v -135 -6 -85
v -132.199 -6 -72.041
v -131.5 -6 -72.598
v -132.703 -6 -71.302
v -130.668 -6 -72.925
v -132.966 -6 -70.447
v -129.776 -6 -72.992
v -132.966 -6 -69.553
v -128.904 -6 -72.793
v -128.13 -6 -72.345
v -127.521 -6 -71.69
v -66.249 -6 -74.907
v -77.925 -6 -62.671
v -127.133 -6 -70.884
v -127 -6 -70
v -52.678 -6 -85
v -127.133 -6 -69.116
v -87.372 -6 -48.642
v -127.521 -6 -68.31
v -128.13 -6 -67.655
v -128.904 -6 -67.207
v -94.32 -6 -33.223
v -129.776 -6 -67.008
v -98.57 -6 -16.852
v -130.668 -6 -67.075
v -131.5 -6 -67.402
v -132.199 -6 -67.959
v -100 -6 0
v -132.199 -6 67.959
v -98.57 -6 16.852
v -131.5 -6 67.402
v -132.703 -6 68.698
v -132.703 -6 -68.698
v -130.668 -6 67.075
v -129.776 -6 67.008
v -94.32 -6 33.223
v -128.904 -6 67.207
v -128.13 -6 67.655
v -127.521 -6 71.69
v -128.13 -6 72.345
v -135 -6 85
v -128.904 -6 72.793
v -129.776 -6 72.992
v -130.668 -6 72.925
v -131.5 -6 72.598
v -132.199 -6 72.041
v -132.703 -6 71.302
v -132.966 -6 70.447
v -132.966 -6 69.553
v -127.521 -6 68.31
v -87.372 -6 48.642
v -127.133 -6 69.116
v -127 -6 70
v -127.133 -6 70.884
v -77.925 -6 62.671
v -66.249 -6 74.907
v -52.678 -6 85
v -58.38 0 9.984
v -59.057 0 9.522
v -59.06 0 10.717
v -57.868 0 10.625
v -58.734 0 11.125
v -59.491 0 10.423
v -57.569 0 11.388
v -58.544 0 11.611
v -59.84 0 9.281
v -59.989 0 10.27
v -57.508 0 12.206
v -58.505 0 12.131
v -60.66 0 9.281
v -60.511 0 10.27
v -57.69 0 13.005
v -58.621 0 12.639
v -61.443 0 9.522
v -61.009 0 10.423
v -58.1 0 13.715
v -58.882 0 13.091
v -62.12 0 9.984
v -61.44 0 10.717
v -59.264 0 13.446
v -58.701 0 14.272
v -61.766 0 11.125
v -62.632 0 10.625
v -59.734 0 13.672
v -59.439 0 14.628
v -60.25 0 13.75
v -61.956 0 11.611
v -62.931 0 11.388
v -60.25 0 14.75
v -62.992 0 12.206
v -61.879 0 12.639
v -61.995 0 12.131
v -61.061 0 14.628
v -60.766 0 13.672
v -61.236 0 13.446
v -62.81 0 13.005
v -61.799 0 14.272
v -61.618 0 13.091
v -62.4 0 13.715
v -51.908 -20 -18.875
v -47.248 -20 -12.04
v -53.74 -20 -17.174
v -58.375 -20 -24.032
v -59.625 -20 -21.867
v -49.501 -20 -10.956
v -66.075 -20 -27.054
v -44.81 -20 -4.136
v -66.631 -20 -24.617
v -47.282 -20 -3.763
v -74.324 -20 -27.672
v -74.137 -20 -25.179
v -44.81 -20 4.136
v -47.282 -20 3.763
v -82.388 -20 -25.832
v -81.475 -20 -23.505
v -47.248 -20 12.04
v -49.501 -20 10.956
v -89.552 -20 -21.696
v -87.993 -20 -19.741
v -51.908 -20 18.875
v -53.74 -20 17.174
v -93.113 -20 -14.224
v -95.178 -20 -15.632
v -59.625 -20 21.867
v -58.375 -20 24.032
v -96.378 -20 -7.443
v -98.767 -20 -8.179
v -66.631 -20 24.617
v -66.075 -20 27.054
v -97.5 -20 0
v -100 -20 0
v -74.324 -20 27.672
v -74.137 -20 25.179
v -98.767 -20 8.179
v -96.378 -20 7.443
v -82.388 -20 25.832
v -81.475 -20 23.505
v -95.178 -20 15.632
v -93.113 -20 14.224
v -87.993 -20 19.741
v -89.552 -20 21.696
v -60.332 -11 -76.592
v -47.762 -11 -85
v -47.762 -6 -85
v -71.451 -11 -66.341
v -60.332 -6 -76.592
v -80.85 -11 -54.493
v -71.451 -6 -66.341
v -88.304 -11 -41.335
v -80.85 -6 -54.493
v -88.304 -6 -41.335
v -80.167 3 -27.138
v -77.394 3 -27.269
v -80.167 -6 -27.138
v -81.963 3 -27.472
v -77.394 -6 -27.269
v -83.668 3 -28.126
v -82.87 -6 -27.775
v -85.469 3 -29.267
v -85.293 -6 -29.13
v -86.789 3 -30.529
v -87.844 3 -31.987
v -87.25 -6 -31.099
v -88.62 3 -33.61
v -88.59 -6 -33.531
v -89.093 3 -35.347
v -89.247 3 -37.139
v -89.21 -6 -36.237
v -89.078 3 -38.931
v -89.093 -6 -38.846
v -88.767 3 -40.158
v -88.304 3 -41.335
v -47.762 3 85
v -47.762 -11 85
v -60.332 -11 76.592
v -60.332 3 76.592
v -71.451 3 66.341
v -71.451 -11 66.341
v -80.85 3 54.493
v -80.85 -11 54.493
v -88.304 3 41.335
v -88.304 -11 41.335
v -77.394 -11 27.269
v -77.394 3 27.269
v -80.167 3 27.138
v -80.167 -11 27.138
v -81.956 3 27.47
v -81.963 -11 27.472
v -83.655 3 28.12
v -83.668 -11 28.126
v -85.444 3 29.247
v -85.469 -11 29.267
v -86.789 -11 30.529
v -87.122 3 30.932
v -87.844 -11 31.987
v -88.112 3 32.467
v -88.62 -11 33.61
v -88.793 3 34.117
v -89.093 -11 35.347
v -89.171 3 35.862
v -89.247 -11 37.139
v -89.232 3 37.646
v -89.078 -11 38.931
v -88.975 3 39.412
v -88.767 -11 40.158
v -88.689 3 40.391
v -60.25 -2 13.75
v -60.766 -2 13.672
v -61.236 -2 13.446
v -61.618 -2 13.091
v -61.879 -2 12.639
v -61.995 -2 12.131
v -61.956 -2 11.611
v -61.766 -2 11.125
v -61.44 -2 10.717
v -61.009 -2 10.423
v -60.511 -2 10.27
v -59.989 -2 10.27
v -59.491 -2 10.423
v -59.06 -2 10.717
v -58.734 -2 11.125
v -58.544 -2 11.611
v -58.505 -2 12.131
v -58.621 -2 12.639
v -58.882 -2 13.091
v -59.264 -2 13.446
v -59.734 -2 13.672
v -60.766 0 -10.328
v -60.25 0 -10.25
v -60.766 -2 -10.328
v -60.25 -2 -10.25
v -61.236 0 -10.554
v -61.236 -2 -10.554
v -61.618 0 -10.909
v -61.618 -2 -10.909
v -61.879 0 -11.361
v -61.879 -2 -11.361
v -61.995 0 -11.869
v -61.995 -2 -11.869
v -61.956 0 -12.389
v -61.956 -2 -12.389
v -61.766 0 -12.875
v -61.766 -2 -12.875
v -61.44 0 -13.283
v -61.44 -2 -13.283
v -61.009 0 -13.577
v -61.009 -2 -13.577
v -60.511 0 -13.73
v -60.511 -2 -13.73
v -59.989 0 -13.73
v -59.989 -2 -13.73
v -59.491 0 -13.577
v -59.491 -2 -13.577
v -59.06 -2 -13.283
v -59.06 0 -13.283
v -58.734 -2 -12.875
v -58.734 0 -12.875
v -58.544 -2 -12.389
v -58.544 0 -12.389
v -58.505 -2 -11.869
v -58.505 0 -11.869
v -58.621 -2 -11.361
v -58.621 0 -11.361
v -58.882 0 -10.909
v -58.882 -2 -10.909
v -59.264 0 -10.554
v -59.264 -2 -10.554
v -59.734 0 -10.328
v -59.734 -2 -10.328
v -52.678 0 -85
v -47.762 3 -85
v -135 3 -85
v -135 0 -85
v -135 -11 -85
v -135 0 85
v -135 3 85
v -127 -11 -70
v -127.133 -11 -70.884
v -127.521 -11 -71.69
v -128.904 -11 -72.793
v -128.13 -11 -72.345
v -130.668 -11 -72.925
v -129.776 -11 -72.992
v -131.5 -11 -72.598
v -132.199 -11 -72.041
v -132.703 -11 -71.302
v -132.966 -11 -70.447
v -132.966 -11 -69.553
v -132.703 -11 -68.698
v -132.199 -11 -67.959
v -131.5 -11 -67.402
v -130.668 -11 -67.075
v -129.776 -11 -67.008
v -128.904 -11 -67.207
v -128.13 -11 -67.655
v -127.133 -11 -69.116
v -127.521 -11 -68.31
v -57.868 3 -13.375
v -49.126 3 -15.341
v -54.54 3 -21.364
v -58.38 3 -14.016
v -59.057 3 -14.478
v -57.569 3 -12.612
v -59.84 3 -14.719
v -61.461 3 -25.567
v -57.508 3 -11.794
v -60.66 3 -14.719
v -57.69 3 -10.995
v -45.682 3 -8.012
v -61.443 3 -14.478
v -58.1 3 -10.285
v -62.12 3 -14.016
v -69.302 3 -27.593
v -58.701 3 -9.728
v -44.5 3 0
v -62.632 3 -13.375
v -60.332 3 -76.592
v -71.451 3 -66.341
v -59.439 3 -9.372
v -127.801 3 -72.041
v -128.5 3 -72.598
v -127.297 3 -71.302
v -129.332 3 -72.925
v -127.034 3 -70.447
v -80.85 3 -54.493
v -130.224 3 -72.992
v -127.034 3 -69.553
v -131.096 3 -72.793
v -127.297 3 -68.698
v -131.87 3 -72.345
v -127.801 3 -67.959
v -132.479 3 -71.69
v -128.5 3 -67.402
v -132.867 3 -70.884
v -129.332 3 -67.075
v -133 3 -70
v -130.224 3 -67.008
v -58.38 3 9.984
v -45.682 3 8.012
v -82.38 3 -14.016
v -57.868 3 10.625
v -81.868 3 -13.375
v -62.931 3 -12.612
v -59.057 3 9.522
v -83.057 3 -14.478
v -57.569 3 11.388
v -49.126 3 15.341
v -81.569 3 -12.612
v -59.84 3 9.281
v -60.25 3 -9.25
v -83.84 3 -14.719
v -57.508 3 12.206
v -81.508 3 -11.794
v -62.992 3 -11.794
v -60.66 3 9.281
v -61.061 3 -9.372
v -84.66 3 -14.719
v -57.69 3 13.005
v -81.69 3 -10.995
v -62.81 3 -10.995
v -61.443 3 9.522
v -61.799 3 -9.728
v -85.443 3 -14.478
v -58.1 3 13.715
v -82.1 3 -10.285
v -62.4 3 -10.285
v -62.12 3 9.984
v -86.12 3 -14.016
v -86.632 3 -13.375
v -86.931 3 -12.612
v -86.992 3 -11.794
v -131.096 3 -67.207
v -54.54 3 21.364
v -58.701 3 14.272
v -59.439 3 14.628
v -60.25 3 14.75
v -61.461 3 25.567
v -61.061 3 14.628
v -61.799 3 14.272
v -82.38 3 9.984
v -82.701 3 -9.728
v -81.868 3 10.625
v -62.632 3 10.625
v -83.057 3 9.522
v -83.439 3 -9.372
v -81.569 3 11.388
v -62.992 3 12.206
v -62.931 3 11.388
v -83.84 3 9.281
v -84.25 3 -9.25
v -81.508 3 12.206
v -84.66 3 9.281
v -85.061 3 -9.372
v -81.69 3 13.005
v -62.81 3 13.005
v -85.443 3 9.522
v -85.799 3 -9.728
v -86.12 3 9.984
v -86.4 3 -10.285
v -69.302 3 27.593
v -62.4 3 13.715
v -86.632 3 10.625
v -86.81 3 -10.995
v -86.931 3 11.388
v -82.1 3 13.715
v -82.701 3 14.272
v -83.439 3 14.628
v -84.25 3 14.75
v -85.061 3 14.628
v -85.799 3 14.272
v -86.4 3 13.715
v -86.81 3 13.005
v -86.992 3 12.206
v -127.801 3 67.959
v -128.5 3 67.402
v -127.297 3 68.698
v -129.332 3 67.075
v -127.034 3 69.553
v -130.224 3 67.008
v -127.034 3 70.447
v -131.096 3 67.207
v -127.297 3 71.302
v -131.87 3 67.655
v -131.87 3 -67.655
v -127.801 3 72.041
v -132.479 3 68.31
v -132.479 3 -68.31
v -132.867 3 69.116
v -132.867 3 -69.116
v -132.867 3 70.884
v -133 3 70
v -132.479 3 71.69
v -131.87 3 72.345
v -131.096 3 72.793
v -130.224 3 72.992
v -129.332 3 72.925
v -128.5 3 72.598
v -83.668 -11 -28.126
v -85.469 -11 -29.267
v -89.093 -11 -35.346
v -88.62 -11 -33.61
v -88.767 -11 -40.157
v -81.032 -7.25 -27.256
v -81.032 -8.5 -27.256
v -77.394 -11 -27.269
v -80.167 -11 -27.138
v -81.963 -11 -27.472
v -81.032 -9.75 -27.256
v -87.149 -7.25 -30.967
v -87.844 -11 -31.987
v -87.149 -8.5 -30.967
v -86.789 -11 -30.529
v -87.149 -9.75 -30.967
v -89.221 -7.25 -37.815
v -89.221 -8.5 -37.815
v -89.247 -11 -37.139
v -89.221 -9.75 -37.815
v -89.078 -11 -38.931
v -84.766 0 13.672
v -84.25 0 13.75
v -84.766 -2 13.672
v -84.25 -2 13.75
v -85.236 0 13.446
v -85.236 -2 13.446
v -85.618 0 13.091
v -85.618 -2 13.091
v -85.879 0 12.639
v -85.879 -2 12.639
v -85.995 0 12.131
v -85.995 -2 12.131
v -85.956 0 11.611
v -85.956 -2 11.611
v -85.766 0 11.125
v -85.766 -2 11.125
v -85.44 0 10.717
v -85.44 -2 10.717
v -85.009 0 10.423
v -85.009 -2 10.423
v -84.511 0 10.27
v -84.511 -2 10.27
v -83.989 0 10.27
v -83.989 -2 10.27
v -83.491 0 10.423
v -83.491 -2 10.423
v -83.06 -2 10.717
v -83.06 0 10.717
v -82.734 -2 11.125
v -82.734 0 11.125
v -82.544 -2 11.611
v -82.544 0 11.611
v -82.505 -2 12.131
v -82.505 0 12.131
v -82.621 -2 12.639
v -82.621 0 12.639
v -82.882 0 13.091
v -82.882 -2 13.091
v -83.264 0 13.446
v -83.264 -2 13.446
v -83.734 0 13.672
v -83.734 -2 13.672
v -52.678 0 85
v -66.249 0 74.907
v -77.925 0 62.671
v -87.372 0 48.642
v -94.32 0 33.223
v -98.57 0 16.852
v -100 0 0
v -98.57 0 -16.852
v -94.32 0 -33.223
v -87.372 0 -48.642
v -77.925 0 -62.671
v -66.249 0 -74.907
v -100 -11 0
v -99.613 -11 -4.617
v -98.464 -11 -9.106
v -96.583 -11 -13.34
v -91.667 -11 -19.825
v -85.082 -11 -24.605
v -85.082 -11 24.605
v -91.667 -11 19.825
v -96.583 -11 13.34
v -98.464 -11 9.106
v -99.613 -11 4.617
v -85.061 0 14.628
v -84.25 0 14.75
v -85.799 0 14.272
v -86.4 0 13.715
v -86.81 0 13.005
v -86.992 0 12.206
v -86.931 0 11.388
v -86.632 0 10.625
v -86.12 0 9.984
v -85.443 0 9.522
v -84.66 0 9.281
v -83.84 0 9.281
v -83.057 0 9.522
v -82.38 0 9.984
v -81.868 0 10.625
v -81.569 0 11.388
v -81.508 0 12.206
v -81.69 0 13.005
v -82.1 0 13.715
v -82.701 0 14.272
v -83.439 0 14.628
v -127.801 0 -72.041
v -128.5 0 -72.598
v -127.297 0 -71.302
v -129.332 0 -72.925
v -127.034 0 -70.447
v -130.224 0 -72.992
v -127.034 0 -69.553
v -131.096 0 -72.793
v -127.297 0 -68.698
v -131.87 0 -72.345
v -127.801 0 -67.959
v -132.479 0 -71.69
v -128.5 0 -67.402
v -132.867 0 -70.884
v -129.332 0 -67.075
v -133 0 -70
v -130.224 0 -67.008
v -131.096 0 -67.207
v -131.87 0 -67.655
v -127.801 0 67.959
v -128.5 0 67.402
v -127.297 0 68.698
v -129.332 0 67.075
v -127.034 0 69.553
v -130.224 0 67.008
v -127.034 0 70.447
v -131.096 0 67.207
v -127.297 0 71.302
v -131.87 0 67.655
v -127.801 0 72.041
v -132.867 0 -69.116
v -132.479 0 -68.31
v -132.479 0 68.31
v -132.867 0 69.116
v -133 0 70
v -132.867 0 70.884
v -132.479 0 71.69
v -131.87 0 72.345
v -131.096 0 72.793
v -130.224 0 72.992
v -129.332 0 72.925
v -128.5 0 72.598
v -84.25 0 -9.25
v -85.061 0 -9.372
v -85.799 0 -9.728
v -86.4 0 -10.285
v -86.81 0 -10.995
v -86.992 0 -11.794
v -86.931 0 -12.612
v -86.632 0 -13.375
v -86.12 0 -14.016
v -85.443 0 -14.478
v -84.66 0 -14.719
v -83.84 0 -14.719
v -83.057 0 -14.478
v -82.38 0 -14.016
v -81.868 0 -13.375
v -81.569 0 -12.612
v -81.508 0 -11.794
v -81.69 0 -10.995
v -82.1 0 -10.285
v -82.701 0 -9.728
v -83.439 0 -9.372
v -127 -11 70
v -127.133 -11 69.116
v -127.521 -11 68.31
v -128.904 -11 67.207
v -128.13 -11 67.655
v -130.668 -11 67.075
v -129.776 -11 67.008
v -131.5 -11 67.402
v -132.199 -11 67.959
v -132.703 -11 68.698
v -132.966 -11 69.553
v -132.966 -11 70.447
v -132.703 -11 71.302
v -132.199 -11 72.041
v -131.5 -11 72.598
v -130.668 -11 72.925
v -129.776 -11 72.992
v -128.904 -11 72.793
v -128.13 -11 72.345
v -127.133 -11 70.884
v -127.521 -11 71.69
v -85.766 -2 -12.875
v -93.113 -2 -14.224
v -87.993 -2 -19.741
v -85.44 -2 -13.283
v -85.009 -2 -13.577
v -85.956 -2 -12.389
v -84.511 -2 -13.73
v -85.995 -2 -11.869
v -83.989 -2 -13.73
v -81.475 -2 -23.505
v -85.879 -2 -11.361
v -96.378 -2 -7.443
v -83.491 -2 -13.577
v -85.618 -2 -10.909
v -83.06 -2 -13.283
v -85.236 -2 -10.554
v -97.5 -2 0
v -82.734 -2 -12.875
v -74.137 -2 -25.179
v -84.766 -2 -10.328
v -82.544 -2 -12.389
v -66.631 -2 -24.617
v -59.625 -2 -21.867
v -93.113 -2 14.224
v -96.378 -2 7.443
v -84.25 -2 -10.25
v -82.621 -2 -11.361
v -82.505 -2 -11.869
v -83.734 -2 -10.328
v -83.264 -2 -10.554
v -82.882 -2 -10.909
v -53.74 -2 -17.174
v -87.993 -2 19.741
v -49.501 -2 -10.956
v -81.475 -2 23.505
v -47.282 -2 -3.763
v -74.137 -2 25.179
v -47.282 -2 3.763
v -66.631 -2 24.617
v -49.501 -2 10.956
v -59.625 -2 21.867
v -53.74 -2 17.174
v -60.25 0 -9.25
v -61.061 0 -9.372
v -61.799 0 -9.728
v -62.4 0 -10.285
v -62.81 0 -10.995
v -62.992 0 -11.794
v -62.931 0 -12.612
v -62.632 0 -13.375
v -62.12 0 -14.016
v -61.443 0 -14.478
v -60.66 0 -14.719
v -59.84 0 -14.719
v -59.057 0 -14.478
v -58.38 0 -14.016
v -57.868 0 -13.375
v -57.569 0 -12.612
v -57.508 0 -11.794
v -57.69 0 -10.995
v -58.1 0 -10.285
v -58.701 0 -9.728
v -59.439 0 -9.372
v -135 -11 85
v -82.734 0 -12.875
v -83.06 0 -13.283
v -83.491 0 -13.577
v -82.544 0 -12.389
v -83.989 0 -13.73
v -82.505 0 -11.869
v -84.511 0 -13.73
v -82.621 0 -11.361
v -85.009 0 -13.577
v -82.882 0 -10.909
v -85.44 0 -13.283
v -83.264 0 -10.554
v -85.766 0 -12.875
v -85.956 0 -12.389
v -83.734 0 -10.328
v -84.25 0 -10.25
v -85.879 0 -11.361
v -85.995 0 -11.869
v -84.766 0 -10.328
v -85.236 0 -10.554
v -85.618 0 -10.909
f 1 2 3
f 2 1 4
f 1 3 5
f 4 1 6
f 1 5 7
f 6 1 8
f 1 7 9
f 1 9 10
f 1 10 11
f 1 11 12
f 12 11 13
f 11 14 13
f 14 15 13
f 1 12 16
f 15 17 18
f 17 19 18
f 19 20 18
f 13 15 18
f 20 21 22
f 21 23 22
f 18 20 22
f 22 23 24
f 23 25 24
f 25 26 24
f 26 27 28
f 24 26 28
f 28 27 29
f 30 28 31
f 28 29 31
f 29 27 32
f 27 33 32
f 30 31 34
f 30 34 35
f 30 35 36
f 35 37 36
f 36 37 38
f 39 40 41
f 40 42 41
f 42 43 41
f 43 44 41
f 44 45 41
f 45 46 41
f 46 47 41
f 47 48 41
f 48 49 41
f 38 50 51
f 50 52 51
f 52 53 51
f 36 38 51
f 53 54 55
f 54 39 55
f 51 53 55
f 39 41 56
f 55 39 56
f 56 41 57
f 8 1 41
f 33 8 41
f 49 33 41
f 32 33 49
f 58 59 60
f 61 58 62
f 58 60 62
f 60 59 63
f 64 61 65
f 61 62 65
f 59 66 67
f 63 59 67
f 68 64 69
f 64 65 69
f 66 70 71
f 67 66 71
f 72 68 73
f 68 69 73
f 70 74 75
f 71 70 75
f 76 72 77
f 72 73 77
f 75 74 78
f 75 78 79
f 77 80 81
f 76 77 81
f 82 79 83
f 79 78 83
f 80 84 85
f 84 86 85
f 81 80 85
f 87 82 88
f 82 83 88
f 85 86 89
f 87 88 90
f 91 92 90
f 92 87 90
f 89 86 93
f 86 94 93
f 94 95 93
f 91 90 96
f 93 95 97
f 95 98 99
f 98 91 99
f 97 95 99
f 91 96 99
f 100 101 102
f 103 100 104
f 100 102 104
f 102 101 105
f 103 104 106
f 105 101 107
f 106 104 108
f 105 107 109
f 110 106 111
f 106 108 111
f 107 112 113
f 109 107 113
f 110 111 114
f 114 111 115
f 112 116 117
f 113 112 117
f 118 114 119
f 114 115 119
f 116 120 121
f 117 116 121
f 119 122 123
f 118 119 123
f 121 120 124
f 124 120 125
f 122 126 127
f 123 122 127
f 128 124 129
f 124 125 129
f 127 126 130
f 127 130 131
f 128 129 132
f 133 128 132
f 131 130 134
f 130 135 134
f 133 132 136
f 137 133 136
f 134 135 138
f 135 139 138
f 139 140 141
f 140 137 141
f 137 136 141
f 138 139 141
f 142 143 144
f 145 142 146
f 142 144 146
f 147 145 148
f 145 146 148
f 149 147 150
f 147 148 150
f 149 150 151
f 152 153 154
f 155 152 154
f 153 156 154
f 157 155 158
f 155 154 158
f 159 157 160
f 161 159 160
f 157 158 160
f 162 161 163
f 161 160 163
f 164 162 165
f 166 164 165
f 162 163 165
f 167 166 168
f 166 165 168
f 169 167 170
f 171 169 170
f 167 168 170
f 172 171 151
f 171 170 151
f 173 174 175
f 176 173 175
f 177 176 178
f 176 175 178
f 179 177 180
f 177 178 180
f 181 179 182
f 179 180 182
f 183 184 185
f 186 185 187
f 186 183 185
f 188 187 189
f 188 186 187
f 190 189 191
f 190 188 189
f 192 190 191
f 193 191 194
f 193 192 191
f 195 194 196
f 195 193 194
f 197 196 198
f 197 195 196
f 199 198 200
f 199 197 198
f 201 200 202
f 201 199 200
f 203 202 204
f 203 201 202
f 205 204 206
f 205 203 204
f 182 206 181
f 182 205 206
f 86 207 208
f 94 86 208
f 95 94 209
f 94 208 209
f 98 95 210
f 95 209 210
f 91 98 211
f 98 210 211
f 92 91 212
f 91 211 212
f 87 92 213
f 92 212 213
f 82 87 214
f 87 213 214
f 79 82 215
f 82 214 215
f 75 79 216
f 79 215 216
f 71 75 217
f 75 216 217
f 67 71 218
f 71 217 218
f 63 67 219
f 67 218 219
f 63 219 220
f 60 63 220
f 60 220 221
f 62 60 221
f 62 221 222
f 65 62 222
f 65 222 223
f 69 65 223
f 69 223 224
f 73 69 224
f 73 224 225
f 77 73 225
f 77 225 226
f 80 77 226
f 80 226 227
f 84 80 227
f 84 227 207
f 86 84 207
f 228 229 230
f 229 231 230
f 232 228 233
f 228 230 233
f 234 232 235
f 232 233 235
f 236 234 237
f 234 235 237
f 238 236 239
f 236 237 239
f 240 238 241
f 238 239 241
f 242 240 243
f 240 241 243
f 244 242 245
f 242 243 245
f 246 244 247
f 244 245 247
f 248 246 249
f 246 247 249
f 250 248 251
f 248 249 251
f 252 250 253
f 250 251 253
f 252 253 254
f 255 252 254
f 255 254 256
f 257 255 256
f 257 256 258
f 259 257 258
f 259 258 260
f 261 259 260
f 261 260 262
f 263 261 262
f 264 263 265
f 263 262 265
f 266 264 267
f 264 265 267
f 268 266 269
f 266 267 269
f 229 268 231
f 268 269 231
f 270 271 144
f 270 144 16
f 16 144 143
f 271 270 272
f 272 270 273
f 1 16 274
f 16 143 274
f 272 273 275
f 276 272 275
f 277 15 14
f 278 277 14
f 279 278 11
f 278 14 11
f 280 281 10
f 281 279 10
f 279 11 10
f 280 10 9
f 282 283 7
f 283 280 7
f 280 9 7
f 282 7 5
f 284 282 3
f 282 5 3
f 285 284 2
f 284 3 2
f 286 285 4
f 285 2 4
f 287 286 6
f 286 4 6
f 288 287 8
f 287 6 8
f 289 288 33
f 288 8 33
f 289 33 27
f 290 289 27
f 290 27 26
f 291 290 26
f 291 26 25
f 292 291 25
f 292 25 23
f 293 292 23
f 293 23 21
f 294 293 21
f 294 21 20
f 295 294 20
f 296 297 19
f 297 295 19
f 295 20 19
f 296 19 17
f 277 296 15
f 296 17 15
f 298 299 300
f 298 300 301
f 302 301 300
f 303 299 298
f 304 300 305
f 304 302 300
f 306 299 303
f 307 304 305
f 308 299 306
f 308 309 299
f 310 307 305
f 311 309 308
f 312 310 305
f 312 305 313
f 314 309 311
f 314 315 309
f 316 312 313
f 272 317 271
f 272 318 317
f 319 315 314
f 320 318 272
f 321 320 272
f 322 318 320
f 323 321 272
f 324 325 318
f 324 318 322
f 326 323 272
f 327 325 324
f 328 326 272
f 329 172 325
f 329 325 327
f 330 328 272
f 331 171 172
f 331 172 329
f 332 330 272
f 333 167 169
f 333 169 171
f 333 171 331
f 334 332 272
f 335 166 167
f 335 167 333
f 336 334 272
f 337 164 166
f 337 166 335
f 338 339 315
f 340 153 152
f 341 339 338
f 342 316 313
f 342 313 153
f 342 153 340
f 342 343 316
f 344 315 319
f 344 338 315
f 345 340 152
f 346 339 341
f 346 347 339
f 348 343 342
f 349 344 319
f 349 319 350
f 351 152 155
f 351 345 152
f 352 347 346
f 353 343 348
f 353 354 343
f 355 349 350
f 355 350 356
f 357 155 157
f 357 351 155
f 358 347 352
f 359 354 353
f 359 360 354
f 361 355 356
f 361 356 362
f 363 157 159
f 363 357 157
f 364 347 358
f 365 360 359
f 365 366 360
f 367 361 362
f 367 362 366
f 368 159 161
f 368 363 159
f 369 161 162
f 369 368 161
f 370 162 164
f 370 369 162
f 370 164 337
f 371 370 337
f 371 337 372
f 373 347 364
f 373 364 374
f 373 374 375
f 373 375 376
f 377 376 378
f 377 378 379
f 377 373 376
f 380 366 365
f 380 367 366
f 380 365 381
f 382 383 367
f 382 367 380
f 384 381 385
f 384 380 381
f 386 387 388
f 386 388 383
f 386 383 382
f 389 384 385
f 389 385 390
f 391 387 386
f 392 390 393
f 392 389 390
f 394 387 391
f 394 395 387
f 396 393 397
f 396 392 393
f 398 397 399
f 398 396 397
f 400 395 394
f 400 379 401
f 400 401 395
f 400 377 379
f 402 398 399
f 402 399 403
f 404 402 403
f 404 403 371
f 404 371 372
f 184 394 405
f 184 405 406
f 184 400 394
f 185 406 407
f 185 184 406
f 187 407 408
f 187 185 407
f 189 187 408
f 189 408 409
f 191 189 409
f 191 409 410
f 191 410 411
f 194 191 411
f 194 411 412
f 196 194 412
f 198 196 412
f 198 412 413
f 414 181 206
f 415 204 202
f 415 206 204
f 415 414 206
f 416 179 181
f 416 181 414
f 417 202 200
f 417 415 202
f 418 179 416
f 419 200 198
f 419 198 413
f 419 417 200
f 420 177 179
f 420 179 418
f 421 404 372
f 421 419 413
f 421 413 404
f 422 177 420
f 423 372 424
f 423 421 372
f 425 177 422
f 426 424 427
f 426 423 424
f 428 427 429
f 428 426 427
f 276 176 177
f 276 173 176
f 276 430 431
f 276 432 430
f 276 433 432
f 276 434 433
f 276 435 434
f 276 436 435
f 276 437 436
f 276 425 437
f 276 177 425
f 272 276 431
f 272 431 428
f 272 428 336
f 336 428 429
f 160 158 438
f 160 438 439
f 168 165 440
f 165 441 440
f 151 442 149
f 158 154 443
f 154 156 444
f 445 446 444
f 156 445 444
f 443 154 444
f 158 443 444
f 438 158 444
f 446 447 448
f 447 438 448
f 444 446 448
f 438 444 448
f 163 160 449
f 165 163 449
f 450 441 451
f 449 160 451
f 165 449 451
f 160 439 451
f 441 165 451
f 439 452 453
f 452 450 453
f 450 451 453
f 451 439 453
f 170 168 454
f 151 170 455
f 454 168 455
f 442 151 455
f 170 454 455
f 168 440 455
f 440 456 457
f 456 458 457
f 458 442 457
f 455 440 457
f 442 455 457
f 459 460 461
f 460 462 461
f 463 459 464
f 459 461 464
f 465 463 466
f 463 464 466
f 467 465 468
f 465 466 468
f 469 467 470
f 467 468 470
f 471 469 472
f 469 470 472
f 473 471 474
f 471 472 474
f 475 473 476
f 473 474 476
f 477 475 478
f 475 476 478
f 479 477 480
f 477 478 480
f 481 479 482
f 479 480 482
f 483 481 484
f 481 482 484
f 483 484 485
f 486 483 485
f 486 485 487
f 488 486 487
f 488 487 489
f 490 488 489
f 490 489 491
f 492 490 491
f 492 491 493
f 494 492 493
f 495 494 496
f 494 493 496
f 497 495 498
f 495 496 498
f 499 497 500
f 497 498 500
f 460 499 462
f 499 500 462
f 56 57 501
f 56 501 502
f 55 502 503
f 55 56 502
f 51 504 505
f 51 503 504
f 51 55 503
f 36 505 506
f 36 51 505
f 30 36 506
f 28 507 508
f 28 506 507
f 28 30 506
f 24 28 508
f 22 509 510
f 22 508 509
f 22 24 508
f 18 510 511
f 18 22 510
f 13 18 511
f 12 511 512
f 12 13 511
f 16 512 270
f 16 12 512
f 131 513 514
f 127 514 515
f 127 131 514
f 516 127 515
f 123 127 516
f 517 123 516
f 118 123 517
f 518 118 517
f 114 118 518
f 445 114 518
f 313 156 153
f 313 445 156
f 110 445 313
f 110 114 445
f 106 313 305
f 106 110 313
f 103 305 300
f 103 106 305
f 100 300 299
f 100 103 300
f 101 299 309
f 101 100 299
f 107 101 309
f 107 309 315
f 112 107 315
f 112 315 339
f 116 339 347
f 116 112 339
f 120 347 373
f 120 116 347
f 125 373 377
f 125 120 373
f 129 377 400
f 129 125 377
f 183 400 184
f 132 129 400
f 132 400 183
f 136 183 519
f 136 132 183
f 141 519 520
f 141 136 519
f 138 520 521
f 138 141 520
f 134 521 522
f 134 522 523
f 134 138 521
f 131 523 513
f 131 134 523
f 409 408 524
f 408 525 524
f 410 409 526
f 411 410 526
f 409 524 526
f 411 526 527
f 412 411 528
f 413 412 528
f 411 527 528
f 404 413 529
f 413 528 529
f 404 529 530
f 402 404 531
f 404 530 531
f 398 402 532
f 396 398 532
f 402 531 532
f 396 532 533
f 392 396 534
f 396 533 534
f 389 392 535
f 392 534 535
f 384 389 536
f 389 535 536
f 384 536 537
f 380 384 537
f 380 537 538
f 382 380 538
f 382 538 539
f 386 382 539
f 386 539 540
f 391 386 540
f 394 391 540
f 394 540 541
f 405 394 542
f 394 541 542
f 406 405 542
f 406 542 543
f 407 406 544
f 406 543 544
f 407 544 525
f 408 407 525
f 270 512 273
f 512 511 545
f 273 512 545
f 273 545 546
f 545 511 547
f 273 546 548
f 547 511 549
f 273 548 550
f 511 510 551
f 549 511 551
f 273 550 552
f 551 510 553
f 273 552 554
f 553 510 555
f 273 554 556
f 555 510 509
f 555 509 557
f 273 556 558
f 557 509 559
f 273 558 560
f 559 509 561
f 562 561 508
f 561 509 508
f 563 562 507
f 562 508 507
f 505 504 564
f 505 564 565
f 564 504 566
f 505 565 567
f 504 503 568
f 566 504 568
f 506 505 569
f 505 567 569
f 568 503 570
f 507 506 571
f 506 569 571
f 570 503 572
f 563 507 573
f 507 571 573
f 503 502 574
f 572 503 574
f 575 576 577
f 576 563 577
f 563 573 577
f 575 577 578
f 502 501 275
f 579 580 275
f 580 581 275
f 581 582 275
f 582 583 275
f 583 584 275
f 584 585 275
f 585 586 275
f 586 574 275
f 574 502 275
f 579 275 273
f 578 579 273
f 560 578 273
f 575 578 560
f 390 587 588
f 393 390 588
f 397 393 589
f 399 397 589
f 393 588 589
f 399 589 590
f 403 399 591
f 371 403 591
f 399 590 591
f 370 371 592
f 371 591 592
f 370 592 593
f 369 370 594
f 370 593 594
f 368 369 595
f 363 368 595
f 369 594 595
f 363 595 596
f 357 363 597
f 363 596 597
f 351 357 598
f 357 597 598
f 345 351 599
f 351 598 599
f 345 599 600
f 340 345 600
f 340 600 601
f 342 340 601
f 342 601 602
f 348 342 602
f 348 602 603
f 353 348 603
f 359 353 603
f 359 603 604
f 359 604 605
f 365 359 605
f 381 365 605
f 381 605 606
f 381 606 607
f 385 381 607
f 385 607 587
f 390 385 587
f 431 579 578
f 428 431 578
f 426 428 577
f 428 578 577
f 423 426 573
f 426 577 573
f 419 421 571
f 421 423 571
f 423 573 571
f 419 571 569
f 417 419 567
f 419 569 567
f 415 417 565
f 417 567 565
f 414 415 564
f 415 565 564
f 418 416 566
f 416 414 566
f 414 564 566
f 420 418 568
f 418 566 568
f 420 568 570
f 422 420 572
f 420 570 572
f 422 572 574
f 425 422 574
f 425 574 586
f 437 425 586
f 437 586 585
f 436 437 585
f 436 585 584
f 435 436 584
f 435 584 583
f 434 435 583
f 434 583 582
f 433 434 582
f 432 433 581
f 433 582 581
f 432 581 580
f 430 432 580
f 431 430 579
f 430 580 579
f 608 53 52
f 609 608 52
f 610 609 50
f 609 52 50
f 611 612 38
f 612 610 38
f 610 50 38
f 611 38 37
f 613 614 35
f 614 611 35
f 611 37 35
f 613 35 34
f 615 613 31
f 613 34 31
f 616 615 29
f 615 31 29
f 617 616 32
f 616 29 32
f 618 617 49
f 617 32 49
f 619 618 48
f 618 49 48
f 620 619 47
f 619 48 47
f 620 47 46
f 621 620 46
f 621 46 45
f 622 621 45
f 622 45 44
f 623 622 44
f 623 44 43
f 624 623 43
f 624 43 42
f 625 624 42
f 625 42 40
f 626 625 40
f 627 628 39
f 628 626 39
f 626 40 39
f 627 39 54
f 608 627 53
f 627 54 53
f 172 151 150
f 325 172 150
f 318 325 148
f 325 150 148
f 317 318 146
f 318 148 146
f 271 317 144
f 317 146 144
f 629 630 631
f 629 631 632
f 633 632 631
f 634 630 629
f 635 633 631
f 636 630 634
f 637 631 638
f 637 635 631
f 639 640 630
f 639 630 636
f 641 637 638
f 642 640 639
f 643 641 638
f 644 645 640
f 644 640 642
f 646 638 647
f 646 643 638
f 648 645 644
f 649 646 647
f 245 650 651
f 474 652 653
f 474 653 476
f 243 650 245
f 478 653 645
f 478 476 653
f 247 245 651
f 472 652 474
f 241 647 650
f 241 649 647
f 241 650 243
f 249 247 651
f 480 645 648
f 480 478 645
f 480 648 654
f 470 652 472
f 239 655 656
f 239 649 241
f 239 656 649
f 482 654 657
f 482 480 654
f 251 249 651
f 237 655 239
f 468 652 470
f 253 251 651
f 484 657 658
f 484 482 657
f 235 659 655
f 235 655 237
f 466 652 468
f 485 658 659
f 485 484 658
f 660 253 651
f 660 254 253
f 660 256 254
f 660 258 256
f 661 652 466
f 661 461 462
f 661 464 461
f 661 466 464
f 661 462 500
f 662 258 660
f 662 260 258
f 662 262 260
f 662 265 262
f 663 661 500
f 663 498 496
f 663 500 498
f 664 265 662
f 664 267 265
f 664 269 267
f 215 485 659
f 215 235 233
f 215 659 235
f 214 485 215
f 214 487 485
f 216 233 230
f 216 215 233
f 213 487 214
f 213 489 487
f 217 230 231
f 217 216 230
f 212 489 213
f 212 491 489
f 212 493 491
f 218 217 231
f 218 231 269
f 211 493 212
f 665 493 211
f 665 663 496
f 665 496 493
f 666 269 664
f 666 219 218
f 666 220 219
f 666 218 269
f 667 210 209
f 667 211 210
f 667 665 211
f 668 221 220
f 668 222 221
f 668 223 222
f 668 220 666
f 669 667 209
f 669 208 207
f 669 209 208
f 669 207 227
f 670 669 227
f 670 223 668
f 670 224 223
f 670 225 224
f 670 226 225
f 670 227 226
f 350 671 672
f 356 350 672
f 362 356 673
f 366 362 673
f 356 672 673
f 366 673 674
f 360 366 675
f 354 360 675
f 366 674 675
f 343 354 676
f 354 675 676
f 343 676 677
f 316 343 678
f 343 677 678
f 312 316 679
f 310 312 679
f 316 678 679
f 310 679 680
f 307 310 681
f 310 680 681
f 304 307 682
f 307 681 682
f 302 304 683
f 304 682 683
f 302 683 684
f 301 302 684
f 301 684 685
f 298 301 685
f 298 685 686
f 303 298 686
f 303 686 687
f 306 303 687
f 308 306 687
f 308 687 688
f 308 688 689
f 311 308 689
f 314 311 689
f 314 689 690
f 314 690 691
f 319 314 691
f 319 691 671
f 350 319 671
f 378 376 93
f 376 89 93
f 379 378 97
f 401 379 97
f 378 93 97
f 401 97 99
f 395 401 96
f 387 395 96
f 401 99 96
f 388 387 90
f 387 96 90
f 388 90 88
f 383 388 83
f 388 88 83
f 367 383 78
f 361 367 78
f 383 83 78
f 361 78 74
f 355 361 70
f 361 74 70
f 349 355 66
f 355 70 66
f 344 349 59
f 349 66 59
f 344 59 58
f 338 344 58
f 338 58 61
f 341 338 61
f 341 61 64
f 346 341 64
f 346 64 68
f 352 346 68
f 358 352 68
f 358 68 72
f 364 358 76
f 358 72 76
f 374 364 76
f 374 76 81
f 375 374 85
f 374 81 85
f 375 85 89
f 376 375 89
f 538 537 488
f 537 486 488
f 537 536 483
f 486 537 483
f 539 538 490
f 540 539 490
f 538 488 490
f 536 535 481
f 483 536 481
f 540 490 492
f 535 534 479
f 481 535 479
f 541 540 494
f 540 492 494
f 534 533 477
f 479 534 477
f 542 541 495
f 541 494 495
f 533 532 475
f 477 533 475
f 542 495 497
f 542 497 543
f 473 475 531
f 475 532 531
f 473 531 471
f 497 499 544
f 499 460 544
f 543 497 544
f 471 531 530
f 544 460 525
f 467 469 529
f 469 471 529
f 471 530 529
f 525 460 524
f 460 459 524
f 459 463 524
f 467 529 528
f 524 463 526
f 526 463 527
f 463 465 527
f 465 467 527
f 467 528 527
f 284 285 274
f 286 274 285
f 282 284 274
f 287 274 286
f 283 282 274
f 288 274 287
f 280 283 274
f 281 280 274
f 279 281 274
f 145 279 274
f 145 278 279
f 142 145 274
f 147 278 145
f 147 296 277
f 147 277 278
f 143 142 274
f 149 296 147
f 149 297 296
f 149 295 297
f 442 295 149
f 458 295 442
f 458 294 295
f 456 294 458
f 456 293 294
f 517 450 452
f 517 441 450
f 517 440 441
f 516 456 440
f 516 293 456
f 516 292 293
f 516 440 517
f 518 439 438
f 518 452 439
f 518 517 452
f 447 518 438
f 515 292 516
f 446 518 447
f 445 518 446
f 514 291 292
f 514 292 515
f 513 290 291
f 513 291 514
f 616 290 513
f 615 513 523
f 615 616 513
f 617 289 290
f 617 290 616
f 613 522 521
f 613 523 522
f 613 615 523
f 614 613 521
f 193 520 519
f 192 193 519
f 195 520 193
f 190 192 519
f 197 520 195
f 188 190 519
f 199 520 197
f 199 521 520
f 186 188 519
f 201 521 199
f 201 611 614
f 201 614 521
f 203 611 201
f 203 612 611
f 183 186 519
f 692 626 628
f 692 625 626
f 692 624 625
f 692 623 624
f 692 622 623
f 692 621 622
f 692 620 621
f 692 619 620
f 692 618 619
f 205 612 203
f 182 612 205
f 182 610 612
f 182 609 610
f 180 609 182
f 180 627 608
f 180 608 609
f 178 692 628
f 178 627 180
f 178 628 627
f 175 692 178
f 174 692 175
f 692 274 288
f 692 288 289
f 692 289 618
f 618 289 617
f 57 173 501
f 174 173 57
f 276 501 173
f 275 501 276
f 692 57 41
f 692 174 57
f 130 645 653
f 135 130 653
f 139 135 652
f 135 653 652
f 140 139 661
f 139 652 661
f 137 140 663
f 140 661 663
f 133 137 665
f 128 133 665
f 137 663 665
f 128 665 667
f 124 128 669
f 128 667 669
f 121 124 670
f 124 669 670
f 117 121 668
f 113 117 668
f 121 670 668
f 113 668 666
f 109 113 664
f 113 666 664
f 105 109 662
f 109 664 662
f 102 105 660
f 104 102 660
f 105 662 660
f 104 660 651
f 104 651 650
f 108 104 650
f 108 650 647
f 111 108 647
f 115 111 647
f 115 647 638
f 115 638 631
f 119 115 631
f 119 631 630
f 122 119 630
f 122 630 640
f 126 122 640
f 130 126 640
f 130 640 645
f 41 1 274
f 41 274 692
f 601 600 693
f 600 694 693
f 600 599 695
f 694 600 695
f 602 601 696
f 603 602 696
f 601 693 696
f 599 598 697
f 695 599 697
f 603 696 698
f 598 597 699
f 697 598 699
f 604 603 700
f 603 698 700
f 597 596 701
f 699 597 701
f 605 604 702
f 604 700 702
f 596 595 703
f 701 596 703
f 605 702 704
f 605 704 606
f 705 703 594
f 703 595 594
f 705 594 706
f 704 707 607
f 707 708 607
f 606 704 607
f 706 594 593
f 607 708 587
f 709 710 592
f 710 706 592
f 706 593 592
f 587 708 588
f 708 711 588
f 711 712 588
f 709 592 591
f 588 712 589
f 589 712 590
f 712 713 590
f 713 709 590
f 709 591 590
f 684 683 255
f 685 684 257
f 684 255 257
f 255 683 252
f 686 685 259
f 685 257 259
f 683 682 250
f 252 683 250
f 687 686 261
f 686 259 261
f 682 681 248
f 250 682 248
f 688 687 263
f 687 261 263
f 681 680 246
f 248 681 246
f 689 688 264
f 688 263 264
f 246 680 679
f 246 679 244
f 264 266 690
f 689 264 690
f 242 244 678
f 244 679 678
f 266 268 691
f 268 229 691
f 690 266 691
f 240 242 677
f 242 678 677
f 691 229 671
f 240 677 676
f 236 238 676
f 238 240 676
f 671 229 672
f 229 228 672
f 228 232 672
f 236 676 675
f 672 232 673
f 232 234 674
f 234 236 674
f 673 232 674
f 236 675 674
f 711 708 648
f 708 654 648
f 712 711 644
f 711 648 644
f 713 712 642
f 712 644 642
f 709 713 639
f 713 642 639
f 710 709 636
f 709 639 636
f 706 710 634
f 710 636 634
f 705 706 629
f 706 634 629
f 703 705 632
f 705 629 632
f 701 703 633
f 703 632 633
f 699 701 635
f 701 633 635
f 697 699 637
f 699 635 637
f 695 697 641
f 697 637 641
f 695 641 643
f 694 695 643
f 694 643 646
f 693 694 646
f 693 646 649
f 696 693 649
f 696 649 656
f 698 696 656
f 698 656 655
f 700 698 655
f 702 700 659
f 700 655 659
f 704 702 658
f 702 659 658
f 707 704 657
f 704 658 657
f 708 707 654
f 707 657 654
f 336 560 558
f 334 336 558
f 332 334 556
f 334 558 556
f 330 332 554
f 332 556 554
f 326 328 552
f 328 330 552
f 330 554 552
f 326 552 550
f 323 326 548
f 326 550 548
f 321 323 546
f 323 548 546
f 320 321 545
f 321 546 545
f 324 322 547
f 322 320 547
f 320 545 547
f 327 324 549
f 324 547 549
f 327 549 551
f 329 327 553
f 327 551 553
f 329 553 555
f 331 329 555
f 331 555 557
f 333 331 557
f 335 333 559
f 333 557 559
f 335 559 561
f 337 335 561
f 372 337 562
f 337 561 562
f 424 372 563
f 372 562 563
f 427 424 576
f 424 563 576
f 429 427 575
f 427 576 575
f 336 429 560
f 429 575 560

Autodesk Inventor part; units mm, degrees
ref_plane "YZ Plane" through (0, 0, 0) normal (1, 0, 0) x (0, 1, 0)
ref_plane "XZ Plane" through (0, 0, 0) normal (0, 1, 0) x (-1, 0, 0)
ref_plane "XY Plane" through (0, 0, 0) normal (0, 0, 1) x (1, 0, 0)
sketch "Sketch1" plane through (0, 0, 0) normal (0, 1, 0) x (-1, 0, 0)
  arc A0 (52.6783, -85) -> (52.6783, 85) centre (0, 0) ccw
  circle A1 centre (130, 70) radius 3
  circle A2 centre (130, -70) radius 3
  line L0 (52.6783, 85) -> (135, 85)
  line L1 (52.6783, -85) -> (135, -85)
  line L2 (135, -85) -> (135, 85)
  circle A3 centre (72.25, 0) radius 25.25
  circle A4 centre (72.25, 0) radius 27.75
  arc A5 (47.7624, -85) -> (47.7624, 85) centre (0, 0) ccw
  line L3 (52.6783, 85) -> (47.7624, 85)
  line L4 (52.6783, -85) -> (47.7624, -85)
  point P0 (100, 0)
  point P1 (96.583, -13.3404)
  point P2 (96.583, 13.3404)
  dimension "d9" = 6
  dimension "d10" = 6
  dimension "d29" = 50.5
  dimension "d30" = 55.5
extrude "Extrusion1" add sketch "Sketch1" along normal blind 3 contours A0 L0 L2 L1 | A3
extrude "Extrusion3" add sketch "Sketch1" along normal blind 3 and the other way blind 20 contours A4 A5 | A5 A4
extrude "Extrusion4" add sketch "Sketch1" along normal blind 3 and the other way blind 6 contours L4 A5 A4 A0 | A4 A5 L3 A0
sketch "Sketch3" plane through (0, -6, 0) normal (0, -1, 0) x (1, 0, 0)
  arc A0 (-96.583, -13.3404) -> (-47.7624, -85) centre (0, 0) ccw projected
  line L0 (0, 0) -> (-135, 0)
  line L1 (-135, -85) -> (-135, 85) projected
  line L2 (-135, 0) -> (-135, 85)
  line L3 (-135, 85) -> (-47.7624, 85) projected
  line L4 (-135, 85) -> (-47.7624, 85)
  line L5 (-47.7624, -85) -> (-135, -85) projected
  line L6 (-135, 0) -> (-135, -85)
  line L7 (-135, -85) -> (-47.7624, -85)
  arc A1 (-47.7624, 85) -> (-47.7624, -85) centre (0, 0) ccw
  circle A2 centre (-130, -70) radius 3 projected
  circle A3 centre (-130, -70) radius 3
  circle A4 centre (-130, 70) radius 3 projected
  circle A5 centre (-130, 70) radius 3
  point P0 (-96.583, -13.3404)
  dimension "d40" = 135
extrude "Extrusion5" add sketch "Sketch3" along normal blind 5
sketch "Sketch6" plane through (-72.25, 0, 0) normal (0, -1, 0) x (1, 0, 0)
  circle A0 centre (0, 0) radius 25.25
  point P0 (72.25, 0)
extrude "Extrusion6" add sketch "Sketch6" along normal blind 2
sketch "Sketch7" plane through (0, 3, 0) normal (0, 1, 0) x (1, 0, 0)
  arc A0 (-96.583, -13.3404) -> (-96.583, 13.3404) centre (-72.25, 0) ccw projected
  line L0 (-72.25, 0) -> (-72.25, -12)
  line L1 (-72.25, -12) -> (-60.25, -12)
  line L2 (-60.25, -12) -> (-60.25, 12)
  line L3 (-60.25, 12) -> (-84.25, 12)
  line L4 (-84.25, 12) -> (-84.25, -12)
  point P0 (0, 0)
  dimension "d57" = 12
  dimension "d58" = 12
  dimension "d59" = 24
  dimension "d60" = 24
  dimension "d61" = 24
hole "Hole2" at (-60.25, 3, 12) at (-60.25, 3, -12) at (-84.25, 3, -12) at (-84.25, 3, 12) direction (0, -1, 0) diameter 3.5 end through all counterbore diameter 5.5 counterbore depth 3
fillet "Fillet1" radius 10 2 edges at (-96.583, -4, -13.3404) (-96.583, -4, 13.3404)
properties part number "ECHO SOUNDER HOLDER FINAL DESIGN (revised)"
